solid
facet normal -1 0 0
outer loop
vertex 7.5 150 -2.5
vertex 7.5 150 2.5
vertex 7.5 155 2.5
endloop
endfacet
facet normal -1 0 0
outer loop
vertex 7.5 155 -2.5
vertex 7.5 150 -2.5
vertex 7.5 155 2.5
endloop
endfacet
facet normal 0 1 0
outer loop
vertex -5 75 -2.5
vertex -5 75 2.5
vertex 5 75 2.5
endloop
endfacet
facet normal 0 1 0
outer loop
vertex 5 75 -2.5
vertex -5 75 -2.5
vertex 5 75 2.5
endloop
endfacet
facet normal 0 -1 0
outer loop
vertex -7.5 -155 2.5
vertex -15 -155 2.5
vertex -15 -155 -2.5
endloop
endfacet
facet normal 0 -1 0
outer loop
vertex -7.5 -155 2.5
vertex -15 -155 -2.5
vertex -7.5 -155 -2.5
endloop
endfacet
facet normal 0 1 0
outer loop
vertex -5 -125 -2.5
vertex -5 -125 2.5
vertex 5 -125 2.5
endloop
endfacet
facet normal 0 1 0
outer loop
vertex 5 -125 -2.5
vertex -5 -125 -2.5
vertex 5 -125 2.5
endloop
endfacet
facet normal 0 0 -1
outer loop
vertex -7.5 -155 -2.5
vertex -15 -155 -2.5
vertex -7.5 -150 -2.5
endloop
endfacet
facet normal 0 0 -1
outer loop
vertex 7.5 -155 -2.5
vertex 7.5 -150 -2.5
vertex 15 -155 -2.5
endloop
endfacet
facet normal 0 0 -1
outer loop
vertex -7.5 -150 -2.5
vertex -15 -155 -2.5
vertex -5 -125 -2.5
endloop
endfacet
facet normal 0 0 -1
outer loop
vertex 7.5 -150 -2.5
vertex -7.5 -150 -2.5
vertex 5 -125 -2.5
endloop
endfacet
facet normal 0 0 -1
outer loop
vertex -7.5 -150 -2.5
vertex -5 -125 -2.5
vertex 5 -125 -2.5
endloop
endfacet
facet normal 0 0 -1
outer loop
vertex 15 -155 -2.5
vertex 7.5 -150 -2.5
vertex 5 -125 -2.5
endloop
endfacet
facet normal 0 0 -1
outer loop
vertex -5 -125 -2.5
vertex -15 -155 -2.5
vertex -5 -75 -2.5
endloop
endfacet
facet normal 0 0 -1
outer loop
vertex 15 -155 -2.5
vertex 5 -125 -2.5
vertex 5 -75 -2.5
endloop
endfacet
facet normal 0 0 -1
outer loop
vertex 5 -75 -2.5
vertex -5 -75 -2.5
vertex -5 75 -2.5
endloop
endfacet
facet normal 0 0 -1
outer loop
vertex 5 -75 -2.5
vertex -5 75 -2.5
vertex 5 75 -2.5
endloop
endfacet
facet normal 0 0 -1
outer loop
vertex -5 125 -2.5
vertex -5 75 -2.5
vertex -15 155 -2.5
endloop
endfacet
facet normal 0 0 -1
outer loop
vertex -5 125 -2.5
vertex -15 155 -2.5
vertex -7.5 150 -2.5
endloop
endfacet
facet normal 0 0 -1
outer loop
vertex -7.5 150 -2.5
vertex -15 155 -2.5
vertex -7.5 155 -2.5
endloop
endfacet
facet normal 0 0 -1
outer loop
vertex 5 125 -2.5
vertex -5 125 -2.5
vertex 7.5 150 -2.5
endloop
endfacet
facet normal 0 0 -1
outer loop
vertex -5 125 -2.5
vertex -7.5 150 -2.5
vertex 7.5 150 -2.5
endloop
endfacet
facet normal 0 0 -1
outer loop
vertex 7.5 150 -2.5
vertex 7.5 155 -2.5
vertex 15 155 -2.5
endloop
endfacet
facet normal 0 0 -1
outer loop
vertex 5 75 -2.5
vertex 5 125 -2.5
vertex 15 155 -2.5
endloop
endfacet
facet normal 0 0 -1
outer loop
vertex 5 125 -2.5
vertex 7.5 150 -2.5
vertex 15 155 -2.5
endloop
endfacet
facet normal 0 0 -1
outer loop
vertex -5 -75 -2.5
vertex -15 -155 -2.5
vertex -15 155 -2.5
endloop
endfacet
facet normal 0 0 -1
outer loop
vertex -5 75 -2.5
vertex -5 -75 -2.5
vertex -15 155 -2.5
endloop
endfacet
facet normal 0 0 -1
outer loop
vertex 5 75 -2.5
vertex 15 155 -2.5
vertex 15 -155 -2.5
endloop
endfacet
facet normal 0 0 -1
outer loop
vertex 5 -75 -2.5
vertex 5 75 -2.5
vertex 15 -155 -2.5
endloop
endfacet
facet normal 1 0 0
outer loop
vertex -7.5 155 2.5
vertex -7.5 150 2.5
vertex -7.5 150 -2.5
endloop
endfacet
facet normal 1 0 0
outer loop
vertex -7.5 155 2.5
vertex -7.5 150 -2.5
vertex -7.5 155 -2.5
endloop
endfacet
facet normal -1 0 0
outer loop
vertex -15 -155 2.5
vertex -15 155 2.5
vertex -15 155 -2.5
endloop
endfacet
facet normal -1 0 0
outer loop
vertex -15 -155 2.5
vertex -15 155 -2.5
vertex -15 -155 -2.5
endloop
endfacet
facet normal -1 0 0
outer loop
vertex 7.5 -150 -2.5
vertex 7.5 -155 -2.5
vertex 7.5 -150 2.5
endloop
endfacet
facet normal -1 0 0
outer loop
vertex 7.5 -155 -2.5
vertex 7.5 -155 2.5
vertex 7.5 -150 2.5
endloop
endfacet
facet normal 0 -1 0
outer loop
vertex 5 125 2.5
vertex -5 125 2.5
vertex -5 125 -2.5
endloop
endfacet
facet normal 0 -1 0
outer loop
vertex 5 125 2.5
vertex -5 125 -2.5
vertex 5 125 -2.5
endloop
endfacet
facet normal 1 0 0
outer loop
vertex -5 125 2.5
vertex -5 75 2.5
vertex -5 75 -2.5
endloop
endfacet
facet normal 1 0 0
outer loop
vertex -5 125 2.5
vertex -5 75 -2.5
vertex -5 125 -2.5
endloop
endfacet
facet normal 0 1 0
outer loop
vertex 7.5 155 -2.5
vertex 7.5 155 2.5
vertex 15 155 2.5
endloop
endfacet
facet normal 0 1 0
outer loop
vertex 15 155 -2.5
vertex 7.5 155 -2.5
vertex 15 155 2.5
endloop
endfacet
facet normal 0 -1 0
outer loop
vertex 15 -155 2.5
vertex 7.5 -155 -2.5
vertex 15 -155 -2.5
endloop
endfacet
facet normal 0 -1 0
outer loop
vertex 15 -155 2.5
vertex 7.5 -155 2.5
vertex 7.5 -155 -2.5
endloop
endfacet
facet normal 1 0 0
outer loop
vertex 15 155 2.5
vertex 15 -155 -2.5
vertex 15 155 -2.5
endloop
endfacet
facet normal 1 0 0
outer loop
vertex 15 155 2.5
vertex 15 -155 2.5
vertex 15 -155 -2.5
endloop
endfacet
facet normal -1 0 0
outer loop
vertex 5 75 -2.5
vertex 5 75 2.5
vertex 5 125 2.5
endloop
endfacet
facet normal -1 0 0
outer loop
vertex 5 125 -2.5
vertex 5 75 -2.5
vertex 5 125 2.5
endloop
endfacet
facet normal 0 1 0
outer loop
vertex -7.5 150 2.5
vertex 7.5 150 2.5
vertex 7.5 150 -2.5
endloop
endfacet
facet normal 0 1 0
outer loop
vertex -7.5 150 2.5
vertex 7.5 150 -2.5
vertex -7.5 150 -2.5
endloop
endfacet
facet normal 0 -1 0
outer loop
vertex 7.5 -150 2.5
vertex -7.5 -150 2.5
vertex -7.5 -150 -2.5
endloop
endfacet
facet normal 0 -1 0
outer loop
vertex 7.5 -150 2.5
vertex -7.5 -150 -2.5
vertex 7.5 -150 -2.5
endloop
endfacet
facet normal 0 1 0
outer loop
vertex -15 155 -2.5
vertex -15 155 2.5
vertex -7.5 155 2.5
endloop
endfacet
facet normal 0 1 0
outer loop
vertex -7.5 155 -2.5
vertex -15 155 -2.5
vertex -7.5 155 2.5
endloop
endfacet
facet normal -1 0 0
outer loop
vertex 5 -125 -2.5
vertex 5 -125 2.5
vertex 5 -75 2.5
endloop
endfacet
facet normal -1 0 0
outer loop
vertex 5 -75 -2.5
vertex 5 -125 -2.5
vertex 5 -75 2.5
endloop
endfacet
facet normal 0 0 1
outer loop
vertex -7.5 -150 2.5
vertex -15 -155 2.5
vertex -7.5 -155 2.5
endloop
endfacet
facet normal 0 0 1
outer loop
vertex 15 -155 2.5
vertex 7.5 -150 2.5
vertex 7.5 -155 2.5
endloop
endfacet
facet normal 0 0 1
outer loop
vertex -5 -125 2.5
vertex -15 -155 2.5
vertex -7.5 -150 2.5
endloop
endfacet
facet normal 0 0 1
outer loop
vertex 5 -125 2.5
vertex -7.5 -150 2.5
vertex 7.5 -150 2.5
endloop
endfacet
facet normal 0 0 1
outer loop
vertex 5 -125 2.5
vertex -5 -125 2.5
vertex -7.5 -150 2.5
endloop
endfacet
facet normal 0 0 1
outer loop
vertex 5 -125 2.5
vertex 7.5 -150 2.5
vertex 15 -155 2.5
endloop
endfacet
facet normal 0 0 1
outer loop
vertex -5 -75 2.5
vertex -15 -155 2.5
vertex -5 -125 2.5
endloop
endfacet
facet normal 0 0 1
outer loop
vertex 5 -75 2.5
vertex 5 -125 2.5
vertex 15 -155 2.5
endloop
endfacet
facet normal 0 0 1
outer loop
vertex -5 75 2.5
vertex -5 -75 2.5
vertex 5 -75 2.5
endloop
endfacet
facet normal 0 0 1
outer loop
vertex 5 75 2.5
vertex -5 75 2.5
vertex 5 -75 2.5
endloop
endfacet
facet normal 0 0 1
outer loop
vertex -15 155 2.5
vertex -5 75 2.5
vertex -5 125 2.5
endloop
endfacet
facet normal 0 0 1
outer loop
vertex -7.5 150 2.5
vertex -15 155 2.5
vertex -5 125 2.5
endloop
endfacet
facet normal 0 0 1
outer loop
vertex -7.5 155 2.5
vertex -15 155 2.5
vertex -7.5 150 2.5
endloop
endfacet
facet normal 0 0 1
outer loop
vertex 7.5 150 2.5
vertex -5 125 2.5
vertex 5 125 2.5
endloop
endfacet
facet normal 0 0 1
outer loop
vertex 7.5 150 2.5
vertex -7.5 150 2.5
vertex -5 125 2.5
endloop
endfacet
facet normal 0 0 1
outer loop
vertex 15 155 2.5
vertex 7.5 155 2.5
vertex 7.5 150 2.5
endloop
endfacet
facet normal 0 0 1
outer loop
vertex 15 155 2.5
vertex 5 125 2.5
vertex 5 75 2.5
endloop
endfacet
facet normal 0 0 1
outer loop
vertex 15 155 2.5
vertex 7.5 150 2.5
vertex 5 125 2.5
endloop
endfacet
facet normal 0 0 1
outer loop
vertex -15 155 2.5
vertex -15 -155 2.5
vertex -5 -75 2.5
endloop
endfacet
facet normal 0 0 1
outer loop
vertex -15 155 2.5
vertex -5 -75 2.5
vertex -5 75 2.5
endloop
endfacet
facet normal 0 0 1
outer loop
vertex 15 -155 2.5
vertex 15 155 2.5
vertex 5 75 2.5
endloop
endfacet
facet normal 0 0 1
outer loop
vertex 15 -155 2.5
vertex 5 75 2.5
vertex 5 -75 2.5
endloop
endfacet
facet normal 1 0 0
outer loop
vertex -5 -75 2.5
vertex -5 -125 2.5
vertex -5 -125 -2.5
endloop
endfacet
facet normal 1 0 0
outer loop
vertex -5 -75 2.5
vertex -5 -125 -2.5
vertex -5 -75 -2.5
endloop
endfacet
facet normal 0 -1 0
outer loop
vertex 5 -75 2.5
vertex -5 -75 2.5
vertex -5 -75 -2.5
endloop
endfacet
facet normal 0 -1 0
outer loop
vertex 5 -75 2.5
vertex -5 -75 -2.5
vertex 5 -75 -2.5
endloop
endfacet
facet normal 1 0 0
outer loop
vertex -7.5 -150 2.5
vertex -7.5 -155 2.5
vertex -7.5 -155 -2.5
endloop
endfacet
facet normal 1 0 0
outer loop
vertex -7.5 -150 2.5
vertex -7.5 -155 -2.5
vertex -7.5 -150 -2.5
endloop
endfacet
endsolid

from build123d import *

# Parameters (mm, degrees)
F0_W     = 7.5
F0_H     = 5
F1_DEPTH = 2.5
F2_W     = 10
F2_H     = 50
F3_DEPTH = 10
F4_W     = 10
F4_H     = 50
F5_DEPTH = 10


with BuildPart() as f1:
    # F0 (on Top) → F1 (new body, symmetric)
    with BuildSketch(Plane.XY):
        Polygon((7.5, -150), (15, -150), (15, 150), (7.5, 150), (-7.5, 150), (-15, 150), (-15, -150), (-7.5, -150), align=None)
        with Locations((-11.25, -152.5)):
            Rectangle(F0_W, F0_H)
        with Locations((11.25, 152.5)):
            Rectangle(F0_W, F0_H)
        with Locations((-11.25, 152.5)):
            Rectangle(F0_W, F0_H)
        with Locations((11.25, -152.5)):
            Rectangle(F0_W, F0_H)
    extrude(amount=F1_DEPTH, both=True)

    # F2 (on face) → F3 (cut)
    with BuildSketch(Plane.XY.offset(2.5)):
        with Locations((0, -100)):
            Rectangle(F2_W, F2_H)
    extrude(amount=-F3_DEPTH, mode=Mode.SUBTRACT)

    # F4 (on face) → F5 (cut)
    with BuildSketch(Plane.XY.offset(2.5)):
        with Locations((0, 100)):
            Rectangle(F4_W, F4_H)
    extrude(amount=-F5_DEPTH, mode=Mode.SUBTRACT)


solid = f1.part
